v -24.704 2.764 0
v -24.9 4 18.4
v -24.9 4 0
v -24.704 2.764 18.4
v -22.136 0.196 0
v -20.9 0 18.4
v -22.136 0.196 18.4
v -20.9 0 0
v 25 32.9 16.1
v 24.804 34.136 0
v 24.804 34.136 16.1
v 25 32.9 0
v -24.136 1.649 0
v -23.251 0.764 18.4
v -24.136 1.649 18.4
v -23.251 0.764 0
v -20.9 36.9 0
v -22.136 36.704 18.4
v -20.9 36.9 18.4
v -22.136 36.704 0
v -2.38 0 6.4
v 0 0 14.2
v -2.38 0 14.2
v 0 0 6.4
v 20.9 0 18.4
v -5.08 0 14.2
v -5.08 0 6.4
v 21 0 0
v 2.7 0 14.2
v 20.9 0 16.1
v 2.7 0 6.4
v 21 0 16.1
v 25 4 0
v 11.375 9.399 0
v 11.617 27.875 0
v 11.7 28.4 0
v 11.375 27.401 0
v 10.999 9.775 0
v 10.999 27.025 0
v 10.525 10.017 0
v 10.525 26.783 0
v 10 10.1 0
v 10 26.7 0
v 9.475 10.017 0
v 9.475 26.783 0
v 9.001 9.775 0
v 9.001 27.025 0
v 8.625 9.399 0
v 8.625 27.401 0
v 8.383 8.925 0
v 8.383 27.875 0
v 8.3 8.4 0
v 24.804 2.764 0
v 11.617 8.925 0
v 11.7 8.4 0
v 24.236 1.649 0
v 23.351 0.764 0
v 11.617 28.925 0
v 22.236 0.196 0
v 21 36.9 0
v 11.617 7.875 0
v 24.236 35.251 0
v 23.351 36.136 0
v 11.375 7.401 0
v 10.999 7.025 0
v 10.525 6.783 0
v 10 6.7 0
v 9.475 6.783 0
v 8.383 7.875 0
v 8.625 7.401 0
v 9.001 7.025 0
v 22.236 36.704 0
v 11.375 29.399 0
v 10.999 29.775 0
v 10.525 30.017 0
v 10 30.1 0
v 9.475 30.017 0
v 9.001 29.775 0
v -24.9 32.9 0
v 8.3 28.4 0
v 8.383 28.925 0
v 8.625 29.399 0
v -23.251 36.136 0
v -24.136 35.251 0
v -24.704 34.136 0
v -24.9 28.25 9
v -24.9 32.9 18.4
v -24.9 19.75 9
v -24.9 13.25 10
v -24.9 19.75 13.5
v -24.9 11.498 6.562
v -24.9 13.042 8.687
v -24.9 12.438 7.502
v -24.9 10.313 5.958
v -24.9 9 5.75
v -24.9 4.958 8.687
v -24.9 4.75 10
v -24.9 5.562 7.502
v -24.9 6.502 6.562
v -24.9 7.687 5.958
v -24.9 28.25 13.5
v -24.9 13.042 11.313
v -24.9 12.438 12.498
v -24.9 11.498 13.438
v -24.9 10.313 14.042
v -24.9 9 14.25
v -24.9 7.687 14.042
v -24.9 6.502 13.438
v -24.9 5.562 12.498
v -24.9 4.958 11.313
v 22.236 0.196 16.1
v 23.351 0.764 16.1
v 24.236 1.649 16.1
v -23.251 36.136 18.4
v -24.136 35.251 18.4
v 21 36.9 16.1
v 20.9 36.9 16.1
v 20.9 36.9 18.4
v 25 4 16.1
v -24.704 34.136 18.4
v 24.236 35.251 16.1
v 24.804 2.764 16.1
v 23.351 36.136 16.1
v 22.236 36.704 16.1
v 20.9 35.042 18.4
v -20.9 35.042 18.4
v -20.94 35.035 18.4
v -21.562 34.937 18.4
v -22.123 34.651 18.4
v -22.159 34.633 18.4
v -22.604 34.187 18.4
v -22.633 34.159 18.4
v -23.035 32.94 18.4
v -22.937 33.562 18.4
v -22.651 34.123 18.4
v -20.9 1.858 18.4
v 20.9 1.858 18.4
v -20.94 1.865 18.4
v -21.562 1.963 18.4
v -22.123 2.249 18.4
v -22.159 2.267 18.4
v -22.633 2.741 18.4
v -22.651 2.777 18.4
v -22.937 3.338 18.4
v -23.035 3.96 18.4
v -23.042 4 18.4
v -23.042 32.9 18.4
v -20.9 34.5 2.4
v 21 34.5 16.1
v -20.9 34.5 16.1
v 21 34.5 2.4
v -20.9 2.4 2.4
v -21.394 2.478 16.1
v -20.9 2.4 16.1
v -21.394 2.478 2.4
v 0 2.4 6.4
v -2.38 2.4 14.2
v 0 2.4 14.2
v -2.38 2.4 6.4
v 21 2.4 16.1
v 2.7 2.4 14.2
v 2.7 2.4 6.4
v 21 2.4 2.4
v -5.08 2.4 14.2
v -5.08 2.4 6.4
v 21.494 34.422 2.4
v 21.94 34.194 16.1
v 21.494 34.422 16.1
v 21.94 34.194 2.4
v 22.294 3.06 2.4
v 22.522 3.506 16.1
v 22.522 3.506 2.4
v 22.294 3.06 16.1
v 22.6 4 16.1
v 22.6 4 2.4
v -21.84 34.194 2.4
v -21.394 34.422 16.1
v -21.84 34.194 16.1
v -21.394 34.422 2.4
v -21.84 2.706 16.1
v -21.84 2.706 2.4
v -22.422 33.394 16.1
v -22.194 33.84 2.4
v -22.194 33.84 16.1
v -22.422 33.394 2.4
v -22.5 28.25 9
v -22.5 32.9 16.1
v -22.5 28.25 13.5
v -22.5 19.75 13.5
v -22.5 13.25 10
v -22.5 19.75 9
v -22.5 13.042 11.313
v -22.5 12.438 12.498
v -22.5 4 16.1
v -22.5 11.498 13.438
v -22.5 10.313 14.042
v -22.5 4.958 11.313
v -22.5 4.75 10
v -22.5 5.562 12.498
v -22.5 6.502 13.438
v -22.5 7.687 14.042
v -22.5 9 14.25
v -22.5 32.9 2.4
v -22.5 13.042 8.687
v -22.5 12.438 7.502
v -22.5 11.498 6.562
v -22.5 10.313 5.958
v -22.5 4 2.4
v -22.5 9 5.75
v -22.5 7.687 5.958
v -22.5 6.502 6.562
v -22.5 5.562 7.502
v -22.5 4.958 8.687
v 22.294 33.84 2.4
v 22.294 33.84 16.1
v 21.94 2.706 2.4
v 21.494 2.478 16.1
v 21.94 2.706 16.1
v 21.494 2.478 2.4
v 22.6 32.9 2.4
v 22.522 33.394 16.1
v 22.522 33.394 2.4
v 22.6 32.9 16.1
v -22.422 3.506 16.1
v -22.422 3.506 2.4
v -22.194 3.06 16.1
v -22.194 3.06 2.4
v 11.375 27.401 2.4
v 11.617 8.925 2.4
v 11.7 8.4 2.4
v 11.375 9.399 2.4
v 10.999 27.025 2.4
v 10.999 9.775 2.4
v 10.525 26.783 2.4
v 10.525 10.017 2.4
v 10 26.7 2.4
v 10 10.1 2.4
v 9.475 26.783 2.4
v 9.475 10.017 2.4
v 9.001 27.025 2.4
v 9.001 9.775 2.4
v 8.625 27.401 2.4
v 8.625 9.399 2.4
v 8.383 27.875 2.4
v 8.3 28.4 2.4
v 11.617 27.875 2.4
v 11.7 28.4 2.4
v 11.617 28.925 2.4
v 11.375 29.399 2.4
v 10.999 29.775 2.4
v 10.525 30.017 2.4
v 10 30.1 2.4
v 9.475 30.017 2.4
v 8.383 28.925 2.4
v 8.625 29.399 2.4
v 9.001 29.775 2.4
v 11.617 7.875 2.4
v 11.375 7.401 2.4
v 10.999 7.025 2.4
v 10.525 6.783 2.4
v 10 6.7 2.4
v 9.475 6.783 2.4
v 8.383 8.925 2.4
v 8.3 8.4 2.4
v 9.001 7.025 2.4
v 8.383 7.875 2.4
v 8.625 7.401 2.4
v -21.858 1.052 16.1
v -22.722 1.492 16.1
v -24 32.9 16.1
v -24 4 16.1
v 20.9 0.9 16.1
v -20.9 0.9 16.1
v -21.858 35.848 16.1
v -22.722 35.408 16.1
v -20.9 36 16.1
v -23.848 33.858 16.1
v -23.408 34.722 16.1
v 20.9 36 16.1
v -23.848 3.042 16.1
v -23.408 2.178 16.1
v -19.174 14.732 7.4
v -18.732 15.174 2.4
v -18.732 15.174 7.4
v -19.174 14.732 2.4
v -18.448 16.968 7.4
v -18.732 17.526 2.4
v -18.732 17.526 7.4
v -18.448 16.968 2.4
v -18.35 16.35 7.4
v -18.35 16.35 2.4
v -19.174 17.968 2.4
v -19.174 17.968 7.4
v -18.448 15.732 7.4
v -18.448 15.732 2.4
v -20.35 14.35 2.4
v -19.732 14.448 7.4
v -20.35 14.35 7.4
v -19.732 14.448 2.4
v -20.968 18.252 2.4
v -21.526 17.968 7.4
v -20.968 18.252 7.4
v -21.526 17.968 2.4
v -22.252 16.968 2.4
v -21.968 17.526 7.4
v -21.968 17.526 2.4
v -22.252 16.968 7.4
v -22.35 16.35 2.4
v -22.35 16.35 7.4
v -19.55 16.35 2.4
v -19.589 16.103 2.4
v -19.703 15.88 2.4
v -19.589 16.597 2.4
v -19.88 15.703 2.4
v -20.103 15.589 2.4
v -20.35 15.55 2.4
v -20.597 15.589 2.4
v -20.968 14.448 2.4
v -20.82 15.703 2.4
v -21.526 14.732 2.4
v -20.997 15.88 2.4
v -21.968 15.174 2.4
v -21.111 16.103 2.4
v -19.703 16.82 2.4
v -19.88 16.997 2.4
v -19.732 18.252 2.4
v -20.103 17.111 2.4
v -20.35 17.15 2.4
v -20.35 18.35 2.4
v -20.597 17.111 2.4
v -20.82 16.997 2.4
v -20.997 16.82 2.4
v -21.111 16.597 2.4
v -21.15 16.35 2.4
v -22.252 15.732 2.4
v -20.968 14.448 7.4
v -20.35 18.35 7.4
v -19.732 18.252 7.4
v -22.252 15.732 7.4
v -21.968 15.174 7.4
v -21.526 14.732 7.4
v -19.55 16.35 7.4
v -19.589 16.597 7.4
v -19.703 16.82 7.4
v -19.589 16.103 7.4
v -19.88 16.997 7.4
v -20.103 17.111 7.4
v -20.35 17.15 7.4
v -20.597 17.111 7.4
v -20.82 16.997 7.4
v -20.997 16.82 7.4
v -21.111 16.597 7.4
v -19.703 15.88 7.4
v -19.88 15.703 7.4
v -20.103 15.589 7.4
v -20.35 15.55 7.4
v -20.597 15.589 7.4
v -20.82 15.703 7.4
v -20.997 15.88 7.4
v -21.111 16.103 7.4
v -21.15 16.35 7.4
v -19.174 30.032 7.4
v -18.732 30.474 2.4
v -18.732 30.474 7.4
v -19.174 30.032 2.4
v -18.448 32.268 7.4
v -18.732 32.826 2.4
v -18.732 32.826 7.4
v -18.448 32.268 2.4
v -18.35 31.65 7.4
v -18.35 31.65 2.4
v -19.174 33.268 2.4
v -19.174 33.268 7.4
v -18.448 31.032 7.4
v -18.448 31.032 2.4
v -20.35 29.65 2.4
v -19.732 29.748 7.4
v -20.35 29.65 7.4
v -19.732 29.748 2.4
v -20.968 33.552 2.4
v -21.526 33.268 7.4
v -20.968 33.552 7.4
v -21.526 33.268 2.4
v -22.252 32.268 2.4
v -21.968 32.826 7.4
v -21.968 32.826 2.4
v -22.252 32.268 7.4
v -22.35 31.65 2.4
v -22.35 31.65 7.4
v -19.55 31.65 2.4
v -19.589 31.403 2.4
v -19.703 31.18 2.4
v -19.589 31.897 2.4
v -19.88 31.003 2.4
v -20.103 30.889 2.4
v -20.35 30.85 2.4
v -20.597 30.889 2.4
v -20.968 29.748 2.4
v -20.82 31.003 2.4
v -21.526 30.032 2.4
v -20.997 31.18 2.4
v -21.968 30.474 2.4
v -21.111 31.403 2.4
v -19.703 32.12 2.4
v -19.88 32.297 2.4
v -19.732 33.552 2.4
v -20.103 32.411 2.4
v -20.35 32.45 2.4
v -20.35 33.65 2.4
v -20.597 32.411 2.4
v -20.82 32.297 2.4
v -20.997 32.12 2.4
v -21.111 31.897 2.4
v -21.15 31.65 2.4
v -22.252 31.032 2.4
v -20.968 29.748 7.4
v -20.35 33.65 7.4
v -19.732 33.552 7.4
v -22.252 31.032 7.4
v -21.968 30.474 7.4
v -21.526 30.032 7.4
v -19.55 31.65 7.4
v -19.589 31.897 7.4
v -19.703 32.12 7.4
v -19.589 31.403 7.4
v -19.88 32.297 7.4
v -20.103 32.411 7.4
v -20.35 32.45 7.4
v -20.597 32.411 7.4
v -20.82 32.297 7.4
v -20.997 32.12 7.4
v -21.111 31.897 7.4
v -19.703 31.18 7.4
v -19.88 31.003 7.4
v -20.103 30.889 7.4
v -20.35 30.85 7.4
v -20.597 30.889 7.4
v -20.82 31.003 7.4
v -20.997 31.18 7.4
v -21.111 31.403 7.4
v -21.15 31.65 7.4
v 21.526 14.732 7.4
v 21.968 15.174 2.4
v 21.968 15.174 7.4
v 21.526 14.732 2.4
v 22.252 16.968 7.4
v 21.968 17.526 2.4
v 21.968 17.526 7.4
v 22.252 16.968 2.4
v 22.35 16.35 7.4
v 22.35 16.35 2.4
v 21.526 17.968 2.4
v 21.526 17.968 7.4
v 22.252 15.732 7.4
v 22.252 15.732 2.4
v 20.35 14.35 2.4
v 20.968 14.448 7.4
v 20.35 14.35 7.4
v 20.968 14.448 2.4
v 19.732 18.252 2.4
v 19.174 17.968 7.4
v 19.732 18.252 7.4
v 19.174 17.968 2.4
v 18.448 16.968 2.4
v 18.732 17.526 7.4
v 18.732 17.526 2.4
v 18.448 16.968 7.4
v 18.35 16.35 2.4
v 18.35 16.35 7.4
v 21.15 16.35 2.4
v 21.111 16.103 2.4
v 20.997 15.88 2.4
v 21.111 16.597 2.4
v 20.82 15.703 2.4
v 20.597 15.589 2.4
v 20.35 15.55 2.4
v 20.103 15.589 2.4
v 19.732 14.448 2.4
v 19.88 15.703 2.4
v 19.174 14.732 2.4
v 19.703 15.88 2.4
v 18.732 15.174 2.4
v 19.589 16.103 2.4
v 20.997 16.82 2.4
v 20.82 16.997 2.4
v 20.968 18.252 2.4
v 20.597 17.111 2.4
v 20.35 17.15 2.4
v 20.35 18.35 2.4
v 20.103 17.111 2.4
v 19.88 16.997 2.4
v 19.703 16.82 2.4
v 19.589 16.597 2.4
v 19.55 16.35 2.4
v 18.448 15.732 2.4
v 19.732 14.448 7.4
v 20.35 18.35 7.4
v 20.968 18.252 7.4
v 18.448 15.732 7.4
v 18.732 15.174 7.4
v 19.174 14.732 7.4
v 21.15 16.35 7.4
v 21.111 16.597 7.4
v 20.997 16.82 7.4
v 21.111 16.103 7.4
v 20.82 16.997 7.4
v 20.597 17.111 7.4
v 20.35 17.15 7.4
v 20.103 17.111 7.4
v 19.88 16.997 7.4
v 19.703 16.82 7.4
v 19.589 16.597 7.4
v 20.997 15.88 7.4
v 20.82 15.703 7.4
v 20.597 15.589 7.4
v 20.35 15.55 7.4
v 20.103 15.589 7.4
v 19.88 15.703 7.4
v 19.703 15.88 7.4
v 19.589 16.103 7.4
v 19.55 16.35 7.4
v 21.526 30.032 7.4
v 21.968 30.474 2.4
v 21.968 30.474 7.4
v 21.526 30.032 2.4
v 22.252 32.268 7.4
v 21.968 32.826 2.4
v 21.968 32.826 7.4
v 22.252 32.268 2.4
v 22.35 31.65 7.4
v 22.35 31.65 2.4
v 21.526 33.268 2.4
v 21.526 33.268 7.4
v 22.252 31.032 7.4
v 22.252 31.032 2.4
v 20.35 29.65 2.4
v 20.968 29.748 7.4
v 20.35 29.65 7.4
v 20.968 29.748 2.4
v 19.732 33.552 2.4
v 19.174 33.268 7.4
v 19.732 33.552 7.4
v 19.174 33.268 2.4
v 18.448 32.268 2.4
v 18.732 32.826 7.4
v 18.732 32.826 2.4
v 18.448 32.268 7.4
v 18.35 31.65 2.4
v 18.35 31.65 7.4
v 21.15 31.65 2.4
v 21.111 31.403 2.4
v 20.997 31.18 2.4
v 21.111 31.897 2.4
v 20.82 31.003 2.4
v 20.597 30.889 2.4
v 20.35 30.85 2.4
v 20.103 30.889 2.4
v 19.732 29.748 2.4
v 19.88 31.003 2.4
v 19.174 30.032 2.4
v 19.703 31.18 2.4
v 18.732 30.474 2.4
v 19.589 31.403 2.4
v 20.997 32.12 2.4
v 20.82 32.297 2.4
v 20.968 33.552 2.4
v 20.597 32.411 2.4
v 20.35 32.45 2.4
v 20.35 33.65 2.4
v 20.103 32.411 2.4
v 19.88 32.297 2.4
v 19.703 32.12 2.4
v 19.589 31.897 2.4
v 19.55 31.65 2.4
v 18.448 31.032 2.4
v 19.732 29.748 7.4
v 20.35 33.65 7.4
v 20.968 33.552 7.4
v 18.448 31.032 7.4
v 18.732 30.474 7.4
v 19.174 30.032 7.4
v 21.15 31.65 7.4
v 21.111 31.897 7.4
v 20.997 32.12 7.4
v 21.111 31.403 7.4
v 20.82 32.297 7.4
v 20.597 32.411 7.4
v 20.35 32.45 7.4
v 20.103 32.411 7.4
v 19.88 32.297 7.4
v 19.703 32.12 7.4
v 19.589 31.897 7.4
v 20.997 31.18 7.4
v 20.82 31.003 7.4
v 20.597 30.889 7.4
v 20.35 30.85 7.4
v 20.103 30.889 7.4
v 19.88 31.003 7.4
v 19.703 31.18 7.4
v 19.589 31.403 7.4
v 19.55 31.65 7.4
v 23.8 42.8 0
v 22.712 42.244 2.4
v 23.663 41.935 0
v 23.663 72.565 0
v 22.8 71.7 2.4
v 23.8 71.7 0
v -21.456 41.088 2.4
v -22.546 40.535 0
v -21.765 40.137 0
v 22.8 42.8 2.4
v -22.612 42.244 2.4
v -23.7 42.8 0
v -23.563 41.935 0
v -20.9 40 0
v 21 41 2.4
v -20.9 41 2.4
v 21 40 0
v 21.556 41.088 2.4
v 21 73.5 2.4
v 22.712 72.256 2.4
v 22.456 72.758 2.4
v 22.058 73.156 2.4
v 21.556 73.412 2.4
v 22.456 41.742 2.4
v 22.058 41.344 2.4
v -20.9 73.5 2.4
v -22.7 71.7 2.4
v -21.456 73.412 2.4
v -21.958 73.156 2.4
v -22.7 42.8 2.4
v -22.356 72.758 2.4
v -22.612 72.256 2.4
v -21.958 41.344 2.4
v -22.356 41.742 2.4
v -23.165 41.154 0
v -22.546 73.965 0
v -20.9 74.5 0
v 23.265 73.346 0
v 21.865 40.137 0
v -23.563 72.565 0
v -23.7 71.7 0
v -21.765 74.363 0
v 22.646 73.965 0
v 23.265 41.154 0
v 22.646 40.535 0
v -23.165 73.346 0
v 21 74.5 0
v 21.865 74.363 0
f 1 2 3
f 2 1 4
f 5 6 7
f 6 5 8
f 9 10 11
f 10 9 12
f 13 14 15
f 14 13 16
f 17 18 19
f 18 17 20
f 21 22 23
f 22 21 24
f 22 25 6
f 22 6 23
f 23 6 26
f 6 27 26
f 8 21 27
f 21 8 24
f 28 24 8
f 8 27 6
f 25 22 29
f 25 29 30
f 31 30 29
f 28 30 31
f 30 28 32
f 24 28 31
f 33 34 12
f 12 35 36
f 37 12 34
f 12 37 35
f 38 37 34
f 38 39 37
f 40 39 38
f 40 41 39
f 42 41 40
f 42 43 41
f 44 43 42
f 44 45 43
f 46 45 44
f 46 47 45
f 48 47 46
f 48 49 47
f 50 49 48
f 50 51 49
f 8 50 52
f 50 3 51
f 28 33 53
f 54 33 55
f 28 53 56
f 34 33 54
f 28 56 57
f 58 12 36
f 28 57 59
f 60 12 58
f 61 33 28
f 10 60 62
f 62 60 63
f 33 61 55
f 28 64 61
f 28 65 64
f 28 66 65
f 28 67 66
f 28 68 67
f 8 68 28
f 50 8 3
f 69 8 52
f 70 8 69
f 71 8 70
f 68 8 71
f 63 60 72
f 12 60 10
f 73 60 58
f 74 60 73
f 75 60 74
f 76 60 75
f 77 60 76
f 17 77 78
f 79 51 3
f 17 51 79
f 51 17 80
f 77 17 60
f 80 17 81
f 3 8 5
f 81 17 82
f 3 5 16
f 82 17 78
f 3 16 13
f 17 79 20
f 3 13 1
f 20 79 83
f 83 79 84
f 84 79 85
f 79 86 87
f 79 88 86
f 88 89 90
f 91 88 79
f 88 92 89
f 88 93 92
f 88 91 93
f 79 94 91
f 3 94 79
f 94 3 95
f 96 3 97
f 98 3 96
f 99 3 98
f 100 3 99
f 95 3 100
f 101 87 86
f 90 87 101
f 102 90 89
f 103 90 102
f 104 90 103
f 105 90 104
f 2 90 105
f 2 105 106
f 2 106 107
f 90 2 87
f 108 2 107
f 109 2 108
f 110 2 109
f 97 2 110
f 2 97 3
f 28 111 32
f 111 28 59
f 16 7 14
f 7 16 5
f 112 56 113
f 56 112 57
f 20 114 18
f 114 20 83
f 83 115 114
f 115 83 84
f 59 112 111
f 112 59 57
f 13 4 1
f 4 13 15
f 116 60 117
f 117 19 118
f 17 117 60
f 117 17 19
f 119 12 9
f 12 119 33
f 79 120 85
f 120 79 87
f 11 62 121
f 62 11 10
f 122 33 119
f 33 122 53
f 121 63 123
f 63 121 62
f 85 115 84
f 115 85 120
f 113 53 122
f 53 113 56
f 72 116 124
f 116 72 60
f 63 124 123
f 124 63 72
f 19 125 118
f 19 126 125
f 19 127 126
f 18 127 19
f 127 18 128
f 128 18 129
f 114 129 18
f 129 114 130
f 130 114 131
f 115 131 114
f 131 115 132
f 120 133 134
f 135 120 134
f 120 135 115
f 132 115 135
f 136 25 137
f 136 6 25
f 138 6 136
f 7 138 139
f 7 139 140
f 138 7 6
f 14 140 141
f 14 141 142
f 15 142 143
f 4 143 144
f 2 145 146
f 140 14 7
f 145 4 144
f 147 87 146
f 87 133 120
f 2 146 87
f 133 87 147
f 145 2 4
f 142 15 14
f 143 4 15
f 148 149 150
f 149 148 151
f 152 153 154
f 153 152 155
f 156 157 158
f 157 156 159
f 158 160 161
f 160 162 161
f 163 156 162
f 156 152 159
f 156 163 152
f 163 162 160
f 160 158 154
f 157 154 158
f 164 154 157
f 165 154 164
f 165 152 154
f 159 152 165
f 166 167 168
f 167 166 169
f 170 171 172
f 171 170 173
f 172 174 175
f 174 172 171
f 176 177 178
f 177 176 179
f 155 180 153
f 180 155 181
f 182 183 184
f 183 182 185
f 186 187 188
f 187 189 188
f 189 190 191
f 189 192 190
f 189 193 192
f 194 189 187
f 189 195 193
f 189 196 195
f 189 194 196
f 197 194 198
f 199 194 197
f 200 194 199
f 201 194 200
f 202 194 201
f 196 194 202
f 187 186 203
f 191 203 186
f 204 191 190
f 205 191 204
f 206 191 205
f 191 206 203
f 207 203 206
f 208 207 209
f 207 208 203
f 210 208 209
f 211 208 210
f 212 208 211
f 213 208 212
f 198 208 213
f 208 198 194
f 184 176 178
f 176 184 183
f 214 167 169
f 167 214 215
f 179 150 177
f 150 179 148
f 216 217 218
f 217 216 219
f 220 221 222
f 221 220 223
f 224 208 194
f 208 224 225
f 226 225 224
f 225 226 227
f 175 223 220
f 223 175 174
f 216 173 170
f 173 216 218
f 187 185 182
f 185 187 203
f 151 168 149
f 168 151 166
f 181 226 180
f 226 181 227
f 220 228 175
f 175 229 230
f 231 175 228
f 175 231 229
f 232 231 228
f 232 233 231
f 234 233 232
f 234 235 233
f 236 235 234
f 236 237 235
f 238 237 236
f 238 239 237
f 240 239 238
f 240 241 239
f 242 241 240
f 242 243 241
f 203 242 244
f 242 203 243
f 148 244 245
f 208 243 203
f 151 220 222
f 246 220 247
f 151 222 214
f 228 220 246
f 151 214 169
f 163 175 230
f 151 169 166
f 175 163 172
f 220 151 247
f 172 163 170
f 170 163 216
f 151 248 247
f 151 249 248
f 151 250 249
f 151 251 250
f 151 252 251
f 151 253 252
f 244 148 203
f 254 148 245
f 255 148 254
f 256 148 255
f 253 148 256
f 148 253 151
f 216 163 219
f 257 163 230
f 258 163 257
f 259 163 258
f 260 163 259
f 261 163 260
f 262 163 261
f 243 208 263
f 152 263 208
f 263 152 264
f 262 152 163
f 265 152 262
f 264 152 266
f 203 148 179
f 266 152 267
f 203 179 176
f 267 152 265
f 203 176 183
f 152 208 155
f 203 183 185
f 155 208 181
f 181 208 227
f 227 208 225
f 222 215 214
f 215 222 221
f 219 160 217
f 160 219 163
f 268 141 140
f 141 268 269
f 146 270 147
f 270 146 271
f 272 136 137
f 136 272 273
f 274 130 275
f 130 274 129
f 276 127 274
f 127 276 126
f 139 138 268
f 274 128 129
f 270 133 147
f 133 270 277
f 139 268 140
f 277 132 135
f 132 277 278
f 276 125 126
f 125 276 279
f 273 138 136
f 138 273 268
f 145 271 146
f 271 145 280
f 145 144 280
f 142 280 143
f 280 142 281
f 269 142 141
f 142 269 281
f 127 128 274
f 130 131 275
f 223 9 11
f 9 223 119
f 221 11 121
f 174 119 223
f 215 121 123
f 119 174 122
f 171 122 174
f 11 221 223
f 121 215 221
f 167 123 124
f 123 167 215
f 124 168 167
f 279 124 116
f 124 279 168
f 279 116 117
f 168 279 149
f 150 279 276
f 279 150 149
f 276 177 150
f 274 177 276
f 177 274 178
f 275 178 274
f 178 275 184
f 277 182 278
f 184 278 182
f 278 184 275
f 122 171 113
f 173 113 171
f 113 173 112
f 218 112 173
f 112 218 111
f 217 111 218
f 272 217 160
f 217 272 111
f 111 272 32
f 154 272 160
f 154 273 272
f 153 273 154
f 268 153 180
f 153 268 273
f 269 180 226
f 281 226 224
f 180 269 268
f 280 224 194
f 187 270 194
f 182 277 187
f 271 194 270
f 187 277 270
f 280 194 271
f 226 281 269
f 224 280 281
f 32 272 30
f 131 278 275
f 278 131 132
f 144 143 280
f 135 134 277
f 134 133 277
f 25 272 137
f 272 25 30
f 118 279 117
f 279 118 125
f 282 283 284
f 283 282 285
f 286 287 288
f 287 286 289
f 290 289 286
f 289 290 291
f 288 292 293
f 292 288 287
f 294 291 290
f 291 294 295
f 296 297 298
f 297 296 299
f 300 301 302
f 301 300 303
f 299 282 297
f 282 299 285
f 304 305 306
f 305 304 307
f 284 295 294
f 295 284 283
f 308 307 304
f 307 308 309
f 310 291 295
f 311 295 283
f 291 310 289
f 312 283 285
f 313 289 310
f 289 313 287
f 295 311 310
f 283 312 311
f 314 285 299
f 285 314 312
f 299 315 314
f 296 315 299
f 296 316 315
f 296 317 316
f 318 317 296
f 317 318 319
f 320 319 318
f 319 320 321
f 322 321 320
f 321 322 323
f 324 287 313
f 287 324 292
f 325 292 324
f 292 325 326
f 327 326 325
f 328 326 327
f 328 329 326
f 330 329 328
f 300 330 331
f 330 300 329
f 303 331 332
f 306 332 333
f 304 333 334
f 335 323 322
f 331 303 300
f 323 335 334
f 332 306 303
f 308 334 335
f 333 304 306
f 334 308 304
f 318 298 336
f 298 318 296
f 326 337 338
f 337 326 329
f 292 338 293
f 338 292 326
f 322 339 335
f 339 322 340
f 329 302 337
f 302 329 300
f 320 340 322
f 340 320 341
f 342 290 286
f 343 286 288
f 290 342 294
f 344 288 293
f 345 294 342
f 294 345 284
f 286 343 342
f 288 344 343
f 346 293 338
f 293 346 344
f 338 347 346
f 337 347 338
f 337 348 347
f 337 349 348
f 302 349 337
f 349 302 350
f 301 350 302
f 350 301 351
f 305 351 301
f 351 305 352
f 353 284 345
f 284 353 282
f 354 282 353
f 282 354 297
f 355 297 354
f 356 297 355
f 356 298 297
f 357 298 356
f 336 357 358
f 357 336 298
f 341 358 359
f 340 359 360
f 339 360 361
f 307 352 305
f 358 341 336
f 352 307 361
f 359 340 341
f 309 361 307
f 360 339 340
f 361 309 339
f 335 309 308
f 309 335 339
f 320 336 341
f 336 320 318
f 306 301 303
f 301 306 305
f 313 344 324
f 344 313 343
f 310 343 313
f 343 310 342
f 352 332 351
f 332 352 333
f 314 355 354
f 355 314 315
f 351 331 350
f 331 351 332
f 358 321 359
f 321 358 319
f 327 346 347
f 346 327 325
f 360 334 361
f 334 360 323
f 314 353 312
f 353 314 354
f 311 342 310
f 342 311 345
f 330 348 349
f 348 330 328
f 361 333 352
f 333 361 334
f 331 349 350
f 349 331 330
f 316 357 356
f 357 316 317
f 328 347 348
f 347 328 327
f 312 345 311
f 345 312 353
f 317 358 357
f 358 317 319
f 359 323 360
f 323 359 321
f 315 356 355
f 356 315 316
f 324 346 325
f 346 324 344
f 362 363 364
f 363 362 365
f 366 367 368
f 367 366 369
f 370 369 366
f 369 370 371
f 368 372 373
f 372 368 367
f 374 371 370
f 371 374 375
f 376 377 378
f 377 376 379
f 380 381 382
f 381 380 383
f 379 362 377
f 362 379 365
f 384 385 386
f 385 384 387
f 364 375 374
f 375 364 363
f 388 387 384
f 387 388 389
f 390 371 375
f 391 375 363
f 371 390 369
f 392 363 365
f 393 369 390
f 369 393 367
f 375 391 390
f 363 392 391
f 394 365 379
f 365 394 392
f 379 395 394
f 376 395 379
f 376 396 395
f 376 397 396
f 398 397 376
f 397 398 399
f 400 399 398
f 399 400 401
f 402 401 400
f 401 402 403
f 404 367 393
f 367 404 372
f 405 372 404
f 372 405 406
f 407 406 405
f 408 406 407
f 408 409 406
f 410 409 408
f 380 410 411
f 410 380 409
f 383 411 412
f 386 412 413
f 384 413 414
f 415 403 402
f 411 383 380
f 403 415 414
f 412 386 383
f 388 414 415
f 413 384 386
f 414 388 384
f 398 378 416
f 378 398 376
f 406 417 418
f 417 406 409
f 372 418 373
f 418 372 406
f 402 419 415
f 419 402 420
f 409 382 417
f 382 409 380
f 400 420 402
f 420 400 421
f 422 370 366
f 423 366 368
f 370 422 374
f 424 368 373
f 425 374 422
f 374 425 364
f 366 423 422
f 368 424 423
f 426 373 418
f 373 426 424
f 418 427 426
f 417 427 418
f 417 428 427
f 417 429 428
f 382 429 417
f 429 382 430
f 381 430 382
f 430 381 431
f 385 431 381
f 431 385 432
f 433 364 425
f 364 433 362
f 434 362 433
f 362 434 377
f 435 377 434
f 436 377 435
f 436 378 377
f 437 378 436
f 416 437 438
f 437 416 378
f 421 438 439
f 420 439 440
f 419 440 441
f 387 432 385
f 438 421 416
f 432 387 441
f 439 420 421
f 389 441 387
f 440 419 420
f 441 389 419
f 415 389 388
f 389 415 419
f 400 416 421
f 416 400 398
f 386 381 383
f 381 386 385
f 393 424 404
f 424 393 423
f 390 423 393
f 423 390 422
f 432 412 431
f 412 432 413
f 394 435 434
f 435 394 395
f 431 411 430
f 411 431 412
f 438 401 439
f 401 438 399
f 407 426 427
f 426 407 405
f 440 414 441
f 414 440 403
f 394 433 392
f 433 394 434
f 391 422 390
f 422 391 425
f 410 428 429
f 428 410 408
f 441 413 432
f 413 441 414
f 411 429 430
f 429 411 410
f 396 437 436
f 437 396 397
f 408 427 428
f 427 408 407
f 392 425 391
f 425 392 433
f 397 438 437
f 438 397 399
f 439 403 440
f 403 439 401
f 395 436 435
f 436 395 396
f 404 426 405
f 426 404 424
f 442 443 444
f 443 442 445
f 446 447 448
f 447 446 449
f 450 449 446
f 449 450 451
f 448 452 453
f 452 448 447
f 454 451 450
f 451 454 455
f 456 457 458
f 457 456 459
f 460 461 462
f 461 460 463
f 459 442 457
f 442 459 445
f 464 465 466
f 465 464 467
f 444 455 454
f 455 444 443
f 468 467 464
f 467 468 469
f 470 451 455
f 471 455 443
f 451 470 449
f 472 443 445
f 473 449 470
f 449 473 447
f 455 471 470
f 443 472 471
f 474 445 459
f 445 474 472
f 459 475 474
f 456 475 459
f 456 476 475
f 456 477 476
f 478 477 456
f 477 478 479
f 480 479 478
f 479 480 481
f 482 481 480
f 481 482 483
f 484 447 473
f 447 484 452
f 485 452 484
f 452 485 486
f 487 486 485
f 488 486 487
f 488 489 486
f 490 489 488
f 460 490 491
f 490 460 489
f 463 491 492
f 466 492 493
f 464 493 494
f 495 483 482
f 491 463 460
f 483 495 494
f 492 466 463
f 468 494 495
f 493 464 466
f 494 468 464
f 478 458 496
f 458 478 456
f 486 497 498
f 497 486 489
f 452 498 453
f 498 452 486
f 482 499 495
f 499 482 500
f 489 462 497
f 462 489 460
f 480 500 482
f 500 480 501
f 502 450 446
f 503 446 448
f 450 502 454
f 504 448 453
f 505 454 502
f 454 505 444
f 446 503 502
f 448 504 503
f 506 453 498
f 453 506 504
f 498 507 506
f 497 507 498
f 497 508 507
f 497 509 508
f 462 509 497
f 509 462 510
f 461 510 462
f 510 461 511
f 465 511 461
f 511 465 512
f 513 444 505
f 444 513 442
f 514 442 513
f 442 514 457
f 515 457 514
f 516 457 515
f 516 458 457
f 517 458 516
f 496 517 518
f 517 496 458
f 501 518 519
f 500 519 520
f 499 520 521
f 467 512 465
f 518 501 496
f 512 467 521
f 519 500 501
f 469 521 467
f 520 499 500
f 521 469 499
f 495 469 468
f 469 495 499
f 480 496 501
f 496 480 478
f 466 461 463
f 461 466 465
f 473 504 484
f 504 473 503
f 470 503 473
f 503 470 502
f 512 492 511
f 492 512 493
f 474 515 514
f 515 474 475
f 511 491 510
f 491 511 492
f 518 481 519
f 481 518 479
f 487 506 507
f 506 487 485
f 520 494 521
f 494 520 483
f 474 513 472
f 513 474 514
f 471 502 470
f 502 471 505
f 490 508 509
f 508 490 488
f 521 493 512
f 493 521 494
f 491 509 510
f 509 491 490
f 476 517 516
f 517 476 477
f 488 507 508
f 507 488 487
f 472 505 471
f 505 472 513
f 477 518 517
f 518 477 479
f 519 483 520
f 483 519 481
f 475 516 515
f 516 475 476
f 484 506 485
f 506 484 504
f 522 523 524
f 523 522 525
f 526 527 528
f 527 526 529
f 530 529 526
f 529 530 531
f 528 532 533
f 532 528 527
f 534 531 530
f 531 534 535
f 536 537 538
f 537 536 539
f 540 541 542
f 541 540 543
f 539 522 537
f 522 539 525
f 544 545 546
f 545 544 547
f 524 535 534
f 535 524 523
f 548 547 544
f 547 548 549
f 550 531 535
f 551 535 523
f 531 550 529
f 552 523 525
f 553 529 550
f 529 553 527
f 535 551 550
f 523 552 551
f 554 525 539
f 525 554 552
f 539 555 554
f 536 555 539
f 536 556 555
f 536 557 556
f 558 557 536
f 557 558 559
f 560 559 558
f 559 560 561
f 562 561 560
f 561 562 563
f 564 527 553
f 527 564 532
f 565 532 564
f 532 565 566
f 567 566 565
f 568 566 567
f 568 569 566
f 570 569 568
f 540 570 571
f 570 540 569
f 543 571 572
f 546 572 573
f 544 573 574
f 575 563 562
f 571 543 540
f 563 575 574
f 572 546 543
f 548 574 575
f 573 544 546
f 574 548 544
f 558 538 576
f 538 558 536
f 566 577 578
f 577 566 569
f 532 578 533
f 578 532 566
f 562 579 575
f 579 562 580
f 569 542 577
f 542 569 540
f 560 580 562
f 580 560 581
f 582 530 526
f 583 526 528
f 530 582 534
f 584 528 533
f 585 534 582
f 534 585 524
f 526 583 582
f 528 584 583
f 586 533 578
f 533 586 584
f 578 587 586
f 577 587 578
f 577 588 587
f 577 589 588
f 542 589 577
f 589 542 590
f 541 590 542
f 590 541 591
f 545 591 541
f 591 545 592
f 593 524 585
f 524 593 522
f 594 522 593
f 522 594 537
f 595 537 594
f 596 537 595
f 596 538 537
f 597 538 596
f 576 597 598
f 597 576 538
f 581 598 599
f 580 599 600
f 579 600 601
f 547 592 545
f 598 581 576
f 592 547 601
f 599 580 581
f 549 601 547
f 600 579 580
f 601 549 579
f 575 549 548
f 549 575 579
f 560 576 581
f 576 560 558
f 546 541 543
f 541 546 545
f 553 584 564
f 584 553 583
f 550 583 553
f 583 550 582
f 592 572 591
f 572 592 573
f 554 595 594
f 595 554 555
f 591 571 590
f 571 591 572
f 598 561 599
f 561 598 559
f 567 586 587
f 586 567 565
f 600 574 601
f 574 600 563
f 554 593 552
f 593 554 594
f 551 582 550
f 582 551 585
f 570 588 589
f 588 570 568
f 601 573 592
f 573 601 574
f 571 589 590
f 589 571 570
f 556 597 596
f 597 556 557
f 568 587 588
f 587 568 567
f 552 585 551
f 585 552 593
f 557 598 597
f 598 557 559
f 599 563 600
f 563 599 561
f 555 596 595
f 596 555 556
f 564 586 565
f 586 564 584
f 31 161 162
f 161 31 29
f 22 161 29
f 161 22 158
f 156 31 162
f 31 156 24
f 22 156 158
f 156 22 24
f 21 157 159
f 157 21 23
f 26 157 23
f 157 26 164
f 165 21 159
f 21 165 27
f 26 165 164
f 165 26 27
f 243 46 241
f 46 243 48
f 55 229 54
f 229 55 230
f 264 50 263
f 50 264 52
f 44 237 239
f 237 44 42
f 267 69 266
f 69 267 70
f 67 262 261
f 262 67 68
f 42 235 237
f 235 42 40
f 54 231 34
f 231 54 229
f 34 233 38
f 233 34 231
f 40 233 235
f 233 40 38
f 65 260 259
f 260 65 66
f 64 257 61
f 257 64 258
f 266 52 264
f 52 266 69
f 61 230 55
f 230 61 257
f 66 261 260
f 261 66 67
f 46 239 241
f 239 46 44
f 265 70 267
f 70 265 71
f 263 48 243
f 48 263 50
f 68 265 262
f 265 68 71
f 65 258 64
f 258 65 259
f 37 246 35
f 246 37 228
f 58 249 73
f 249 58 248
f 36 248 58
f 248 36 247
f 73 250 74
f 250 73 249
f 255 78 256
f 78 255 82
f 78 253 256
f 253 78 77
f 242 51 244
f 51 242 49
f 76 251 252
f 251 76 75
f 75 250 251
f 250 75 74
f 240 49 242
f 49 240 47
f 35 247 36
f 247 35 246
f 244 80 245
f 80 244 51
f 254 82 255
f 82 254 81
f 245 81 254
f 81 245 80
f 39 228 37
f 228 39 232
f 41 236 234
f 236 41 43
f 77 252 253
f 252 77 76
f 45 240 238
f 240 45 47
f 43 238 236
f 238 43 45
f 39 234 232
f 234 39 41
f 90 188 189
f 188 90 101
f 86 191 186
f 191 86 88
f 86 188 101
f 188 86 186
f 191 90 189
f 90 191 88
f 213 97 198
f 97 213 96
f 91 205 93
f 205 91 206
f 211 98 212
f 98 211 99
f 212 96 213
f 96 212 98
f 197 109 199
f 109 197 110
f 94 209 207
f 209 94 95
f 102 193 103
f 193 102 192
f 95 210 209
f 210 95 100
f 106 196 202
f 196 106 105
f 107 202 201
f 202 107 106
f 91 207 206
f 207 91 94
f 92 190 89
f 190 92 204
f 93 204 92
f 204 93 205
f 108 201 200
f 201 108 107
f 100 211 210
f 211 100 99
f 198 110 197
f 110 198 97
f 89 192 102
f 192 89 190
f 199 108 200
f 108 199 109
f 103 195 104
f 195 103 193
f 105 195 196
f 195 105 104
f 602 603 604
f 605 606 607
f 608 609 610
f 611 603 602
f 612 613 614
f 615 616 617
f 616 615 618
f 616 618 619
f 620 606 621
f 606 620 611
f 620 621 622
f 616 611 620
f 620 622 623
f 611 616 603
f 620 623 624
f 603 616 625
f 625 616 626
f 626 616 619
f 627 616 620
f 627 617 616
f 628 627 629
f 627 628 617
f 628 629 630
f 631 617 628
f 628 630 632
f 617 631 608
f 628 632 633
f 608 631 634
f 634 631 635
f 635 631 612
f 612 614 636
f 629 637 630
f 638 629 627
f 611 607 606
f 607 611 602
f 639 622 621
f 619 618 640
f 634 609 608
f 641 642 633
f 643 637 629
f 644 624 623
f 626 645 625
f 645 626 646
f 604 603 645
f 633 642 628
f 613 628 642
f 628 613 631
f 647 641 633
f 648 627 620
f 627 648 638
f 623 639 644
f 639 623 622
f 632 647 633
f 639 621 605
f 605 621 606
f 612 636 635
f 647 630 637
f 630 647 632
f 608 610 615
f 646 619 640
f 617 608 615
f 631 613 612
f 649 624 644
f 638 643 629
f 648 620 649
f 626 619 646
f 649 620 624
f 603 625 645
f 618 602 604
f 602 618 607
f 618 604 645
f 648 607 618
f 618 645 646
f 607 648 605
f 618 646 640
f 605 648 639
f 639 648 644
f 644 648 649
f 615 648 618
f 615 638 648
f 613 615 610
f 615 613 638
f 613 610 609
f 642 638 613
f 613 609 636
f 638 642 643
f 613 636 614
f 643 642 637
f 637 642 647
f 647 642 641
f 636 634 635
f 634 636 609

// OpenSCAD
// outer dimensions
width = 32 + 4.8;
length = 45.0 + 4.8;
height = 16;
thickness = 2.4;
//ensure that the edge roundness is greater than the wall thickness
corner_radius = 4;
tolerance = 0.3;

connSize = [2.7, 2.7, 7.8];
connSep = 2.54*2;
usbSize = [8.5, 8.5, 4.5];
holeSep = [40.7, 15.3];
holeDiam = 1.6;
spacerDiam = 4.0;
spacerLength = 5.0;
pcbThickness = 1.6;
nanoPos = 24;

connZPos = 4;
powerConnDiam = 8.5;
powerConnYPos = 9;
powerConnZPos = 10;

// lid slope
slope1 = 1.5;
slope2 = 0.5;

t = 0.1;

$fn = 20;

// aliases
size = [length, width, height];
th = thickness;
r = corner_radius;
d = 2*r;

innerSize = [size[0] - 2*th + t, size[1] - 2*th + t, size[2] - th];
echo("Inner size:", innerSize);

module outerCorner(x, y) {
    translate([(size[0] - d + t)*x, (size[1] - d + t)*y, 0])
        cylinder(size[2] + th, r=r);
}

module innerCorner(x, y) {
    translate([(size[0] - d + t)*x, (size[1] - d + t)*y, 0])
        cylinder(size[2], r=r-th);
}

module lidGrooveCorner(x, y) {
    translate([(size[0] - d + th - t)*x, (size[1] - d + t)*y, 0])
        cylinder(th, r - th + slope1, r - th + slope2);
}

module lidCorner(x, y) {
    translate([(size[0] - d + t)*x, (size[1] - d + t)*y, 0])
        cylinder(th, r - th + slope1 - tolerance, r - th + slope2 - tolerance);
}

module box() {
    translate([r, r, 0])
        difference () {
            hull() { for (i=[0, 1], j=[0, 1]) outerCorner(i, j); }

            translate([0, 0, th])
                hull() { for (i=[0, 1], j=[0, 1]) innerCorner(i, j); }

            translate([0, 0, size[2] + t])
                hull() { for (i=[0, 1], j=[0, 1]) lidGrooveCorner(i, j); }

            translate([size[0] - d, -r, size[2] + t])
                cube([r, size[1] + t, th]);
        }
}

module lid() {
    translate([r, r, 0])
        hull() { for (i=[0, 1], j=[0, 1]) lidCorner(i, j); }
}

module spacer() {
    difference() {
        cylinder(spacerLength, d=spacerDiam);
        cylinder(spacerLength + t, d=holeDiam);
    }
}

module pcbBox() {
    difference() {
        union() {
            translate([-length/2, 0, 0]) box();
            // spacers
            for (i=[-1, 1], j=[-1, 1])
                translate([i*holeSep[0]/2, j*holeSep[1]/2 + nanoPos, th]) spacer();
        }

        // connector holes
        h = th + spacerLength + pcbThickness;
        translate([-length/2 - t, nanoPos + - usbSize[0]/2, h]) cube(usbSize);
        for (i=[0, -1])
            translate([i*connSep, -t, th + connZPos]) cube(connSize);
        translate([-length/2 - t, powerConnYPos, powerConnZPos])
            rotate([0, 90, 0]) cylinder(th + 2*t, d=powerConnDiam);

        // mounting holes
        for (i=[-1, 1])
            translate([10, width/2 + i*10, -t]) cylinder(th + 2*t, d=3.4);
    }
}

pcbBox();
translate([-length/2, size[1] + 2, 0]) lid();
